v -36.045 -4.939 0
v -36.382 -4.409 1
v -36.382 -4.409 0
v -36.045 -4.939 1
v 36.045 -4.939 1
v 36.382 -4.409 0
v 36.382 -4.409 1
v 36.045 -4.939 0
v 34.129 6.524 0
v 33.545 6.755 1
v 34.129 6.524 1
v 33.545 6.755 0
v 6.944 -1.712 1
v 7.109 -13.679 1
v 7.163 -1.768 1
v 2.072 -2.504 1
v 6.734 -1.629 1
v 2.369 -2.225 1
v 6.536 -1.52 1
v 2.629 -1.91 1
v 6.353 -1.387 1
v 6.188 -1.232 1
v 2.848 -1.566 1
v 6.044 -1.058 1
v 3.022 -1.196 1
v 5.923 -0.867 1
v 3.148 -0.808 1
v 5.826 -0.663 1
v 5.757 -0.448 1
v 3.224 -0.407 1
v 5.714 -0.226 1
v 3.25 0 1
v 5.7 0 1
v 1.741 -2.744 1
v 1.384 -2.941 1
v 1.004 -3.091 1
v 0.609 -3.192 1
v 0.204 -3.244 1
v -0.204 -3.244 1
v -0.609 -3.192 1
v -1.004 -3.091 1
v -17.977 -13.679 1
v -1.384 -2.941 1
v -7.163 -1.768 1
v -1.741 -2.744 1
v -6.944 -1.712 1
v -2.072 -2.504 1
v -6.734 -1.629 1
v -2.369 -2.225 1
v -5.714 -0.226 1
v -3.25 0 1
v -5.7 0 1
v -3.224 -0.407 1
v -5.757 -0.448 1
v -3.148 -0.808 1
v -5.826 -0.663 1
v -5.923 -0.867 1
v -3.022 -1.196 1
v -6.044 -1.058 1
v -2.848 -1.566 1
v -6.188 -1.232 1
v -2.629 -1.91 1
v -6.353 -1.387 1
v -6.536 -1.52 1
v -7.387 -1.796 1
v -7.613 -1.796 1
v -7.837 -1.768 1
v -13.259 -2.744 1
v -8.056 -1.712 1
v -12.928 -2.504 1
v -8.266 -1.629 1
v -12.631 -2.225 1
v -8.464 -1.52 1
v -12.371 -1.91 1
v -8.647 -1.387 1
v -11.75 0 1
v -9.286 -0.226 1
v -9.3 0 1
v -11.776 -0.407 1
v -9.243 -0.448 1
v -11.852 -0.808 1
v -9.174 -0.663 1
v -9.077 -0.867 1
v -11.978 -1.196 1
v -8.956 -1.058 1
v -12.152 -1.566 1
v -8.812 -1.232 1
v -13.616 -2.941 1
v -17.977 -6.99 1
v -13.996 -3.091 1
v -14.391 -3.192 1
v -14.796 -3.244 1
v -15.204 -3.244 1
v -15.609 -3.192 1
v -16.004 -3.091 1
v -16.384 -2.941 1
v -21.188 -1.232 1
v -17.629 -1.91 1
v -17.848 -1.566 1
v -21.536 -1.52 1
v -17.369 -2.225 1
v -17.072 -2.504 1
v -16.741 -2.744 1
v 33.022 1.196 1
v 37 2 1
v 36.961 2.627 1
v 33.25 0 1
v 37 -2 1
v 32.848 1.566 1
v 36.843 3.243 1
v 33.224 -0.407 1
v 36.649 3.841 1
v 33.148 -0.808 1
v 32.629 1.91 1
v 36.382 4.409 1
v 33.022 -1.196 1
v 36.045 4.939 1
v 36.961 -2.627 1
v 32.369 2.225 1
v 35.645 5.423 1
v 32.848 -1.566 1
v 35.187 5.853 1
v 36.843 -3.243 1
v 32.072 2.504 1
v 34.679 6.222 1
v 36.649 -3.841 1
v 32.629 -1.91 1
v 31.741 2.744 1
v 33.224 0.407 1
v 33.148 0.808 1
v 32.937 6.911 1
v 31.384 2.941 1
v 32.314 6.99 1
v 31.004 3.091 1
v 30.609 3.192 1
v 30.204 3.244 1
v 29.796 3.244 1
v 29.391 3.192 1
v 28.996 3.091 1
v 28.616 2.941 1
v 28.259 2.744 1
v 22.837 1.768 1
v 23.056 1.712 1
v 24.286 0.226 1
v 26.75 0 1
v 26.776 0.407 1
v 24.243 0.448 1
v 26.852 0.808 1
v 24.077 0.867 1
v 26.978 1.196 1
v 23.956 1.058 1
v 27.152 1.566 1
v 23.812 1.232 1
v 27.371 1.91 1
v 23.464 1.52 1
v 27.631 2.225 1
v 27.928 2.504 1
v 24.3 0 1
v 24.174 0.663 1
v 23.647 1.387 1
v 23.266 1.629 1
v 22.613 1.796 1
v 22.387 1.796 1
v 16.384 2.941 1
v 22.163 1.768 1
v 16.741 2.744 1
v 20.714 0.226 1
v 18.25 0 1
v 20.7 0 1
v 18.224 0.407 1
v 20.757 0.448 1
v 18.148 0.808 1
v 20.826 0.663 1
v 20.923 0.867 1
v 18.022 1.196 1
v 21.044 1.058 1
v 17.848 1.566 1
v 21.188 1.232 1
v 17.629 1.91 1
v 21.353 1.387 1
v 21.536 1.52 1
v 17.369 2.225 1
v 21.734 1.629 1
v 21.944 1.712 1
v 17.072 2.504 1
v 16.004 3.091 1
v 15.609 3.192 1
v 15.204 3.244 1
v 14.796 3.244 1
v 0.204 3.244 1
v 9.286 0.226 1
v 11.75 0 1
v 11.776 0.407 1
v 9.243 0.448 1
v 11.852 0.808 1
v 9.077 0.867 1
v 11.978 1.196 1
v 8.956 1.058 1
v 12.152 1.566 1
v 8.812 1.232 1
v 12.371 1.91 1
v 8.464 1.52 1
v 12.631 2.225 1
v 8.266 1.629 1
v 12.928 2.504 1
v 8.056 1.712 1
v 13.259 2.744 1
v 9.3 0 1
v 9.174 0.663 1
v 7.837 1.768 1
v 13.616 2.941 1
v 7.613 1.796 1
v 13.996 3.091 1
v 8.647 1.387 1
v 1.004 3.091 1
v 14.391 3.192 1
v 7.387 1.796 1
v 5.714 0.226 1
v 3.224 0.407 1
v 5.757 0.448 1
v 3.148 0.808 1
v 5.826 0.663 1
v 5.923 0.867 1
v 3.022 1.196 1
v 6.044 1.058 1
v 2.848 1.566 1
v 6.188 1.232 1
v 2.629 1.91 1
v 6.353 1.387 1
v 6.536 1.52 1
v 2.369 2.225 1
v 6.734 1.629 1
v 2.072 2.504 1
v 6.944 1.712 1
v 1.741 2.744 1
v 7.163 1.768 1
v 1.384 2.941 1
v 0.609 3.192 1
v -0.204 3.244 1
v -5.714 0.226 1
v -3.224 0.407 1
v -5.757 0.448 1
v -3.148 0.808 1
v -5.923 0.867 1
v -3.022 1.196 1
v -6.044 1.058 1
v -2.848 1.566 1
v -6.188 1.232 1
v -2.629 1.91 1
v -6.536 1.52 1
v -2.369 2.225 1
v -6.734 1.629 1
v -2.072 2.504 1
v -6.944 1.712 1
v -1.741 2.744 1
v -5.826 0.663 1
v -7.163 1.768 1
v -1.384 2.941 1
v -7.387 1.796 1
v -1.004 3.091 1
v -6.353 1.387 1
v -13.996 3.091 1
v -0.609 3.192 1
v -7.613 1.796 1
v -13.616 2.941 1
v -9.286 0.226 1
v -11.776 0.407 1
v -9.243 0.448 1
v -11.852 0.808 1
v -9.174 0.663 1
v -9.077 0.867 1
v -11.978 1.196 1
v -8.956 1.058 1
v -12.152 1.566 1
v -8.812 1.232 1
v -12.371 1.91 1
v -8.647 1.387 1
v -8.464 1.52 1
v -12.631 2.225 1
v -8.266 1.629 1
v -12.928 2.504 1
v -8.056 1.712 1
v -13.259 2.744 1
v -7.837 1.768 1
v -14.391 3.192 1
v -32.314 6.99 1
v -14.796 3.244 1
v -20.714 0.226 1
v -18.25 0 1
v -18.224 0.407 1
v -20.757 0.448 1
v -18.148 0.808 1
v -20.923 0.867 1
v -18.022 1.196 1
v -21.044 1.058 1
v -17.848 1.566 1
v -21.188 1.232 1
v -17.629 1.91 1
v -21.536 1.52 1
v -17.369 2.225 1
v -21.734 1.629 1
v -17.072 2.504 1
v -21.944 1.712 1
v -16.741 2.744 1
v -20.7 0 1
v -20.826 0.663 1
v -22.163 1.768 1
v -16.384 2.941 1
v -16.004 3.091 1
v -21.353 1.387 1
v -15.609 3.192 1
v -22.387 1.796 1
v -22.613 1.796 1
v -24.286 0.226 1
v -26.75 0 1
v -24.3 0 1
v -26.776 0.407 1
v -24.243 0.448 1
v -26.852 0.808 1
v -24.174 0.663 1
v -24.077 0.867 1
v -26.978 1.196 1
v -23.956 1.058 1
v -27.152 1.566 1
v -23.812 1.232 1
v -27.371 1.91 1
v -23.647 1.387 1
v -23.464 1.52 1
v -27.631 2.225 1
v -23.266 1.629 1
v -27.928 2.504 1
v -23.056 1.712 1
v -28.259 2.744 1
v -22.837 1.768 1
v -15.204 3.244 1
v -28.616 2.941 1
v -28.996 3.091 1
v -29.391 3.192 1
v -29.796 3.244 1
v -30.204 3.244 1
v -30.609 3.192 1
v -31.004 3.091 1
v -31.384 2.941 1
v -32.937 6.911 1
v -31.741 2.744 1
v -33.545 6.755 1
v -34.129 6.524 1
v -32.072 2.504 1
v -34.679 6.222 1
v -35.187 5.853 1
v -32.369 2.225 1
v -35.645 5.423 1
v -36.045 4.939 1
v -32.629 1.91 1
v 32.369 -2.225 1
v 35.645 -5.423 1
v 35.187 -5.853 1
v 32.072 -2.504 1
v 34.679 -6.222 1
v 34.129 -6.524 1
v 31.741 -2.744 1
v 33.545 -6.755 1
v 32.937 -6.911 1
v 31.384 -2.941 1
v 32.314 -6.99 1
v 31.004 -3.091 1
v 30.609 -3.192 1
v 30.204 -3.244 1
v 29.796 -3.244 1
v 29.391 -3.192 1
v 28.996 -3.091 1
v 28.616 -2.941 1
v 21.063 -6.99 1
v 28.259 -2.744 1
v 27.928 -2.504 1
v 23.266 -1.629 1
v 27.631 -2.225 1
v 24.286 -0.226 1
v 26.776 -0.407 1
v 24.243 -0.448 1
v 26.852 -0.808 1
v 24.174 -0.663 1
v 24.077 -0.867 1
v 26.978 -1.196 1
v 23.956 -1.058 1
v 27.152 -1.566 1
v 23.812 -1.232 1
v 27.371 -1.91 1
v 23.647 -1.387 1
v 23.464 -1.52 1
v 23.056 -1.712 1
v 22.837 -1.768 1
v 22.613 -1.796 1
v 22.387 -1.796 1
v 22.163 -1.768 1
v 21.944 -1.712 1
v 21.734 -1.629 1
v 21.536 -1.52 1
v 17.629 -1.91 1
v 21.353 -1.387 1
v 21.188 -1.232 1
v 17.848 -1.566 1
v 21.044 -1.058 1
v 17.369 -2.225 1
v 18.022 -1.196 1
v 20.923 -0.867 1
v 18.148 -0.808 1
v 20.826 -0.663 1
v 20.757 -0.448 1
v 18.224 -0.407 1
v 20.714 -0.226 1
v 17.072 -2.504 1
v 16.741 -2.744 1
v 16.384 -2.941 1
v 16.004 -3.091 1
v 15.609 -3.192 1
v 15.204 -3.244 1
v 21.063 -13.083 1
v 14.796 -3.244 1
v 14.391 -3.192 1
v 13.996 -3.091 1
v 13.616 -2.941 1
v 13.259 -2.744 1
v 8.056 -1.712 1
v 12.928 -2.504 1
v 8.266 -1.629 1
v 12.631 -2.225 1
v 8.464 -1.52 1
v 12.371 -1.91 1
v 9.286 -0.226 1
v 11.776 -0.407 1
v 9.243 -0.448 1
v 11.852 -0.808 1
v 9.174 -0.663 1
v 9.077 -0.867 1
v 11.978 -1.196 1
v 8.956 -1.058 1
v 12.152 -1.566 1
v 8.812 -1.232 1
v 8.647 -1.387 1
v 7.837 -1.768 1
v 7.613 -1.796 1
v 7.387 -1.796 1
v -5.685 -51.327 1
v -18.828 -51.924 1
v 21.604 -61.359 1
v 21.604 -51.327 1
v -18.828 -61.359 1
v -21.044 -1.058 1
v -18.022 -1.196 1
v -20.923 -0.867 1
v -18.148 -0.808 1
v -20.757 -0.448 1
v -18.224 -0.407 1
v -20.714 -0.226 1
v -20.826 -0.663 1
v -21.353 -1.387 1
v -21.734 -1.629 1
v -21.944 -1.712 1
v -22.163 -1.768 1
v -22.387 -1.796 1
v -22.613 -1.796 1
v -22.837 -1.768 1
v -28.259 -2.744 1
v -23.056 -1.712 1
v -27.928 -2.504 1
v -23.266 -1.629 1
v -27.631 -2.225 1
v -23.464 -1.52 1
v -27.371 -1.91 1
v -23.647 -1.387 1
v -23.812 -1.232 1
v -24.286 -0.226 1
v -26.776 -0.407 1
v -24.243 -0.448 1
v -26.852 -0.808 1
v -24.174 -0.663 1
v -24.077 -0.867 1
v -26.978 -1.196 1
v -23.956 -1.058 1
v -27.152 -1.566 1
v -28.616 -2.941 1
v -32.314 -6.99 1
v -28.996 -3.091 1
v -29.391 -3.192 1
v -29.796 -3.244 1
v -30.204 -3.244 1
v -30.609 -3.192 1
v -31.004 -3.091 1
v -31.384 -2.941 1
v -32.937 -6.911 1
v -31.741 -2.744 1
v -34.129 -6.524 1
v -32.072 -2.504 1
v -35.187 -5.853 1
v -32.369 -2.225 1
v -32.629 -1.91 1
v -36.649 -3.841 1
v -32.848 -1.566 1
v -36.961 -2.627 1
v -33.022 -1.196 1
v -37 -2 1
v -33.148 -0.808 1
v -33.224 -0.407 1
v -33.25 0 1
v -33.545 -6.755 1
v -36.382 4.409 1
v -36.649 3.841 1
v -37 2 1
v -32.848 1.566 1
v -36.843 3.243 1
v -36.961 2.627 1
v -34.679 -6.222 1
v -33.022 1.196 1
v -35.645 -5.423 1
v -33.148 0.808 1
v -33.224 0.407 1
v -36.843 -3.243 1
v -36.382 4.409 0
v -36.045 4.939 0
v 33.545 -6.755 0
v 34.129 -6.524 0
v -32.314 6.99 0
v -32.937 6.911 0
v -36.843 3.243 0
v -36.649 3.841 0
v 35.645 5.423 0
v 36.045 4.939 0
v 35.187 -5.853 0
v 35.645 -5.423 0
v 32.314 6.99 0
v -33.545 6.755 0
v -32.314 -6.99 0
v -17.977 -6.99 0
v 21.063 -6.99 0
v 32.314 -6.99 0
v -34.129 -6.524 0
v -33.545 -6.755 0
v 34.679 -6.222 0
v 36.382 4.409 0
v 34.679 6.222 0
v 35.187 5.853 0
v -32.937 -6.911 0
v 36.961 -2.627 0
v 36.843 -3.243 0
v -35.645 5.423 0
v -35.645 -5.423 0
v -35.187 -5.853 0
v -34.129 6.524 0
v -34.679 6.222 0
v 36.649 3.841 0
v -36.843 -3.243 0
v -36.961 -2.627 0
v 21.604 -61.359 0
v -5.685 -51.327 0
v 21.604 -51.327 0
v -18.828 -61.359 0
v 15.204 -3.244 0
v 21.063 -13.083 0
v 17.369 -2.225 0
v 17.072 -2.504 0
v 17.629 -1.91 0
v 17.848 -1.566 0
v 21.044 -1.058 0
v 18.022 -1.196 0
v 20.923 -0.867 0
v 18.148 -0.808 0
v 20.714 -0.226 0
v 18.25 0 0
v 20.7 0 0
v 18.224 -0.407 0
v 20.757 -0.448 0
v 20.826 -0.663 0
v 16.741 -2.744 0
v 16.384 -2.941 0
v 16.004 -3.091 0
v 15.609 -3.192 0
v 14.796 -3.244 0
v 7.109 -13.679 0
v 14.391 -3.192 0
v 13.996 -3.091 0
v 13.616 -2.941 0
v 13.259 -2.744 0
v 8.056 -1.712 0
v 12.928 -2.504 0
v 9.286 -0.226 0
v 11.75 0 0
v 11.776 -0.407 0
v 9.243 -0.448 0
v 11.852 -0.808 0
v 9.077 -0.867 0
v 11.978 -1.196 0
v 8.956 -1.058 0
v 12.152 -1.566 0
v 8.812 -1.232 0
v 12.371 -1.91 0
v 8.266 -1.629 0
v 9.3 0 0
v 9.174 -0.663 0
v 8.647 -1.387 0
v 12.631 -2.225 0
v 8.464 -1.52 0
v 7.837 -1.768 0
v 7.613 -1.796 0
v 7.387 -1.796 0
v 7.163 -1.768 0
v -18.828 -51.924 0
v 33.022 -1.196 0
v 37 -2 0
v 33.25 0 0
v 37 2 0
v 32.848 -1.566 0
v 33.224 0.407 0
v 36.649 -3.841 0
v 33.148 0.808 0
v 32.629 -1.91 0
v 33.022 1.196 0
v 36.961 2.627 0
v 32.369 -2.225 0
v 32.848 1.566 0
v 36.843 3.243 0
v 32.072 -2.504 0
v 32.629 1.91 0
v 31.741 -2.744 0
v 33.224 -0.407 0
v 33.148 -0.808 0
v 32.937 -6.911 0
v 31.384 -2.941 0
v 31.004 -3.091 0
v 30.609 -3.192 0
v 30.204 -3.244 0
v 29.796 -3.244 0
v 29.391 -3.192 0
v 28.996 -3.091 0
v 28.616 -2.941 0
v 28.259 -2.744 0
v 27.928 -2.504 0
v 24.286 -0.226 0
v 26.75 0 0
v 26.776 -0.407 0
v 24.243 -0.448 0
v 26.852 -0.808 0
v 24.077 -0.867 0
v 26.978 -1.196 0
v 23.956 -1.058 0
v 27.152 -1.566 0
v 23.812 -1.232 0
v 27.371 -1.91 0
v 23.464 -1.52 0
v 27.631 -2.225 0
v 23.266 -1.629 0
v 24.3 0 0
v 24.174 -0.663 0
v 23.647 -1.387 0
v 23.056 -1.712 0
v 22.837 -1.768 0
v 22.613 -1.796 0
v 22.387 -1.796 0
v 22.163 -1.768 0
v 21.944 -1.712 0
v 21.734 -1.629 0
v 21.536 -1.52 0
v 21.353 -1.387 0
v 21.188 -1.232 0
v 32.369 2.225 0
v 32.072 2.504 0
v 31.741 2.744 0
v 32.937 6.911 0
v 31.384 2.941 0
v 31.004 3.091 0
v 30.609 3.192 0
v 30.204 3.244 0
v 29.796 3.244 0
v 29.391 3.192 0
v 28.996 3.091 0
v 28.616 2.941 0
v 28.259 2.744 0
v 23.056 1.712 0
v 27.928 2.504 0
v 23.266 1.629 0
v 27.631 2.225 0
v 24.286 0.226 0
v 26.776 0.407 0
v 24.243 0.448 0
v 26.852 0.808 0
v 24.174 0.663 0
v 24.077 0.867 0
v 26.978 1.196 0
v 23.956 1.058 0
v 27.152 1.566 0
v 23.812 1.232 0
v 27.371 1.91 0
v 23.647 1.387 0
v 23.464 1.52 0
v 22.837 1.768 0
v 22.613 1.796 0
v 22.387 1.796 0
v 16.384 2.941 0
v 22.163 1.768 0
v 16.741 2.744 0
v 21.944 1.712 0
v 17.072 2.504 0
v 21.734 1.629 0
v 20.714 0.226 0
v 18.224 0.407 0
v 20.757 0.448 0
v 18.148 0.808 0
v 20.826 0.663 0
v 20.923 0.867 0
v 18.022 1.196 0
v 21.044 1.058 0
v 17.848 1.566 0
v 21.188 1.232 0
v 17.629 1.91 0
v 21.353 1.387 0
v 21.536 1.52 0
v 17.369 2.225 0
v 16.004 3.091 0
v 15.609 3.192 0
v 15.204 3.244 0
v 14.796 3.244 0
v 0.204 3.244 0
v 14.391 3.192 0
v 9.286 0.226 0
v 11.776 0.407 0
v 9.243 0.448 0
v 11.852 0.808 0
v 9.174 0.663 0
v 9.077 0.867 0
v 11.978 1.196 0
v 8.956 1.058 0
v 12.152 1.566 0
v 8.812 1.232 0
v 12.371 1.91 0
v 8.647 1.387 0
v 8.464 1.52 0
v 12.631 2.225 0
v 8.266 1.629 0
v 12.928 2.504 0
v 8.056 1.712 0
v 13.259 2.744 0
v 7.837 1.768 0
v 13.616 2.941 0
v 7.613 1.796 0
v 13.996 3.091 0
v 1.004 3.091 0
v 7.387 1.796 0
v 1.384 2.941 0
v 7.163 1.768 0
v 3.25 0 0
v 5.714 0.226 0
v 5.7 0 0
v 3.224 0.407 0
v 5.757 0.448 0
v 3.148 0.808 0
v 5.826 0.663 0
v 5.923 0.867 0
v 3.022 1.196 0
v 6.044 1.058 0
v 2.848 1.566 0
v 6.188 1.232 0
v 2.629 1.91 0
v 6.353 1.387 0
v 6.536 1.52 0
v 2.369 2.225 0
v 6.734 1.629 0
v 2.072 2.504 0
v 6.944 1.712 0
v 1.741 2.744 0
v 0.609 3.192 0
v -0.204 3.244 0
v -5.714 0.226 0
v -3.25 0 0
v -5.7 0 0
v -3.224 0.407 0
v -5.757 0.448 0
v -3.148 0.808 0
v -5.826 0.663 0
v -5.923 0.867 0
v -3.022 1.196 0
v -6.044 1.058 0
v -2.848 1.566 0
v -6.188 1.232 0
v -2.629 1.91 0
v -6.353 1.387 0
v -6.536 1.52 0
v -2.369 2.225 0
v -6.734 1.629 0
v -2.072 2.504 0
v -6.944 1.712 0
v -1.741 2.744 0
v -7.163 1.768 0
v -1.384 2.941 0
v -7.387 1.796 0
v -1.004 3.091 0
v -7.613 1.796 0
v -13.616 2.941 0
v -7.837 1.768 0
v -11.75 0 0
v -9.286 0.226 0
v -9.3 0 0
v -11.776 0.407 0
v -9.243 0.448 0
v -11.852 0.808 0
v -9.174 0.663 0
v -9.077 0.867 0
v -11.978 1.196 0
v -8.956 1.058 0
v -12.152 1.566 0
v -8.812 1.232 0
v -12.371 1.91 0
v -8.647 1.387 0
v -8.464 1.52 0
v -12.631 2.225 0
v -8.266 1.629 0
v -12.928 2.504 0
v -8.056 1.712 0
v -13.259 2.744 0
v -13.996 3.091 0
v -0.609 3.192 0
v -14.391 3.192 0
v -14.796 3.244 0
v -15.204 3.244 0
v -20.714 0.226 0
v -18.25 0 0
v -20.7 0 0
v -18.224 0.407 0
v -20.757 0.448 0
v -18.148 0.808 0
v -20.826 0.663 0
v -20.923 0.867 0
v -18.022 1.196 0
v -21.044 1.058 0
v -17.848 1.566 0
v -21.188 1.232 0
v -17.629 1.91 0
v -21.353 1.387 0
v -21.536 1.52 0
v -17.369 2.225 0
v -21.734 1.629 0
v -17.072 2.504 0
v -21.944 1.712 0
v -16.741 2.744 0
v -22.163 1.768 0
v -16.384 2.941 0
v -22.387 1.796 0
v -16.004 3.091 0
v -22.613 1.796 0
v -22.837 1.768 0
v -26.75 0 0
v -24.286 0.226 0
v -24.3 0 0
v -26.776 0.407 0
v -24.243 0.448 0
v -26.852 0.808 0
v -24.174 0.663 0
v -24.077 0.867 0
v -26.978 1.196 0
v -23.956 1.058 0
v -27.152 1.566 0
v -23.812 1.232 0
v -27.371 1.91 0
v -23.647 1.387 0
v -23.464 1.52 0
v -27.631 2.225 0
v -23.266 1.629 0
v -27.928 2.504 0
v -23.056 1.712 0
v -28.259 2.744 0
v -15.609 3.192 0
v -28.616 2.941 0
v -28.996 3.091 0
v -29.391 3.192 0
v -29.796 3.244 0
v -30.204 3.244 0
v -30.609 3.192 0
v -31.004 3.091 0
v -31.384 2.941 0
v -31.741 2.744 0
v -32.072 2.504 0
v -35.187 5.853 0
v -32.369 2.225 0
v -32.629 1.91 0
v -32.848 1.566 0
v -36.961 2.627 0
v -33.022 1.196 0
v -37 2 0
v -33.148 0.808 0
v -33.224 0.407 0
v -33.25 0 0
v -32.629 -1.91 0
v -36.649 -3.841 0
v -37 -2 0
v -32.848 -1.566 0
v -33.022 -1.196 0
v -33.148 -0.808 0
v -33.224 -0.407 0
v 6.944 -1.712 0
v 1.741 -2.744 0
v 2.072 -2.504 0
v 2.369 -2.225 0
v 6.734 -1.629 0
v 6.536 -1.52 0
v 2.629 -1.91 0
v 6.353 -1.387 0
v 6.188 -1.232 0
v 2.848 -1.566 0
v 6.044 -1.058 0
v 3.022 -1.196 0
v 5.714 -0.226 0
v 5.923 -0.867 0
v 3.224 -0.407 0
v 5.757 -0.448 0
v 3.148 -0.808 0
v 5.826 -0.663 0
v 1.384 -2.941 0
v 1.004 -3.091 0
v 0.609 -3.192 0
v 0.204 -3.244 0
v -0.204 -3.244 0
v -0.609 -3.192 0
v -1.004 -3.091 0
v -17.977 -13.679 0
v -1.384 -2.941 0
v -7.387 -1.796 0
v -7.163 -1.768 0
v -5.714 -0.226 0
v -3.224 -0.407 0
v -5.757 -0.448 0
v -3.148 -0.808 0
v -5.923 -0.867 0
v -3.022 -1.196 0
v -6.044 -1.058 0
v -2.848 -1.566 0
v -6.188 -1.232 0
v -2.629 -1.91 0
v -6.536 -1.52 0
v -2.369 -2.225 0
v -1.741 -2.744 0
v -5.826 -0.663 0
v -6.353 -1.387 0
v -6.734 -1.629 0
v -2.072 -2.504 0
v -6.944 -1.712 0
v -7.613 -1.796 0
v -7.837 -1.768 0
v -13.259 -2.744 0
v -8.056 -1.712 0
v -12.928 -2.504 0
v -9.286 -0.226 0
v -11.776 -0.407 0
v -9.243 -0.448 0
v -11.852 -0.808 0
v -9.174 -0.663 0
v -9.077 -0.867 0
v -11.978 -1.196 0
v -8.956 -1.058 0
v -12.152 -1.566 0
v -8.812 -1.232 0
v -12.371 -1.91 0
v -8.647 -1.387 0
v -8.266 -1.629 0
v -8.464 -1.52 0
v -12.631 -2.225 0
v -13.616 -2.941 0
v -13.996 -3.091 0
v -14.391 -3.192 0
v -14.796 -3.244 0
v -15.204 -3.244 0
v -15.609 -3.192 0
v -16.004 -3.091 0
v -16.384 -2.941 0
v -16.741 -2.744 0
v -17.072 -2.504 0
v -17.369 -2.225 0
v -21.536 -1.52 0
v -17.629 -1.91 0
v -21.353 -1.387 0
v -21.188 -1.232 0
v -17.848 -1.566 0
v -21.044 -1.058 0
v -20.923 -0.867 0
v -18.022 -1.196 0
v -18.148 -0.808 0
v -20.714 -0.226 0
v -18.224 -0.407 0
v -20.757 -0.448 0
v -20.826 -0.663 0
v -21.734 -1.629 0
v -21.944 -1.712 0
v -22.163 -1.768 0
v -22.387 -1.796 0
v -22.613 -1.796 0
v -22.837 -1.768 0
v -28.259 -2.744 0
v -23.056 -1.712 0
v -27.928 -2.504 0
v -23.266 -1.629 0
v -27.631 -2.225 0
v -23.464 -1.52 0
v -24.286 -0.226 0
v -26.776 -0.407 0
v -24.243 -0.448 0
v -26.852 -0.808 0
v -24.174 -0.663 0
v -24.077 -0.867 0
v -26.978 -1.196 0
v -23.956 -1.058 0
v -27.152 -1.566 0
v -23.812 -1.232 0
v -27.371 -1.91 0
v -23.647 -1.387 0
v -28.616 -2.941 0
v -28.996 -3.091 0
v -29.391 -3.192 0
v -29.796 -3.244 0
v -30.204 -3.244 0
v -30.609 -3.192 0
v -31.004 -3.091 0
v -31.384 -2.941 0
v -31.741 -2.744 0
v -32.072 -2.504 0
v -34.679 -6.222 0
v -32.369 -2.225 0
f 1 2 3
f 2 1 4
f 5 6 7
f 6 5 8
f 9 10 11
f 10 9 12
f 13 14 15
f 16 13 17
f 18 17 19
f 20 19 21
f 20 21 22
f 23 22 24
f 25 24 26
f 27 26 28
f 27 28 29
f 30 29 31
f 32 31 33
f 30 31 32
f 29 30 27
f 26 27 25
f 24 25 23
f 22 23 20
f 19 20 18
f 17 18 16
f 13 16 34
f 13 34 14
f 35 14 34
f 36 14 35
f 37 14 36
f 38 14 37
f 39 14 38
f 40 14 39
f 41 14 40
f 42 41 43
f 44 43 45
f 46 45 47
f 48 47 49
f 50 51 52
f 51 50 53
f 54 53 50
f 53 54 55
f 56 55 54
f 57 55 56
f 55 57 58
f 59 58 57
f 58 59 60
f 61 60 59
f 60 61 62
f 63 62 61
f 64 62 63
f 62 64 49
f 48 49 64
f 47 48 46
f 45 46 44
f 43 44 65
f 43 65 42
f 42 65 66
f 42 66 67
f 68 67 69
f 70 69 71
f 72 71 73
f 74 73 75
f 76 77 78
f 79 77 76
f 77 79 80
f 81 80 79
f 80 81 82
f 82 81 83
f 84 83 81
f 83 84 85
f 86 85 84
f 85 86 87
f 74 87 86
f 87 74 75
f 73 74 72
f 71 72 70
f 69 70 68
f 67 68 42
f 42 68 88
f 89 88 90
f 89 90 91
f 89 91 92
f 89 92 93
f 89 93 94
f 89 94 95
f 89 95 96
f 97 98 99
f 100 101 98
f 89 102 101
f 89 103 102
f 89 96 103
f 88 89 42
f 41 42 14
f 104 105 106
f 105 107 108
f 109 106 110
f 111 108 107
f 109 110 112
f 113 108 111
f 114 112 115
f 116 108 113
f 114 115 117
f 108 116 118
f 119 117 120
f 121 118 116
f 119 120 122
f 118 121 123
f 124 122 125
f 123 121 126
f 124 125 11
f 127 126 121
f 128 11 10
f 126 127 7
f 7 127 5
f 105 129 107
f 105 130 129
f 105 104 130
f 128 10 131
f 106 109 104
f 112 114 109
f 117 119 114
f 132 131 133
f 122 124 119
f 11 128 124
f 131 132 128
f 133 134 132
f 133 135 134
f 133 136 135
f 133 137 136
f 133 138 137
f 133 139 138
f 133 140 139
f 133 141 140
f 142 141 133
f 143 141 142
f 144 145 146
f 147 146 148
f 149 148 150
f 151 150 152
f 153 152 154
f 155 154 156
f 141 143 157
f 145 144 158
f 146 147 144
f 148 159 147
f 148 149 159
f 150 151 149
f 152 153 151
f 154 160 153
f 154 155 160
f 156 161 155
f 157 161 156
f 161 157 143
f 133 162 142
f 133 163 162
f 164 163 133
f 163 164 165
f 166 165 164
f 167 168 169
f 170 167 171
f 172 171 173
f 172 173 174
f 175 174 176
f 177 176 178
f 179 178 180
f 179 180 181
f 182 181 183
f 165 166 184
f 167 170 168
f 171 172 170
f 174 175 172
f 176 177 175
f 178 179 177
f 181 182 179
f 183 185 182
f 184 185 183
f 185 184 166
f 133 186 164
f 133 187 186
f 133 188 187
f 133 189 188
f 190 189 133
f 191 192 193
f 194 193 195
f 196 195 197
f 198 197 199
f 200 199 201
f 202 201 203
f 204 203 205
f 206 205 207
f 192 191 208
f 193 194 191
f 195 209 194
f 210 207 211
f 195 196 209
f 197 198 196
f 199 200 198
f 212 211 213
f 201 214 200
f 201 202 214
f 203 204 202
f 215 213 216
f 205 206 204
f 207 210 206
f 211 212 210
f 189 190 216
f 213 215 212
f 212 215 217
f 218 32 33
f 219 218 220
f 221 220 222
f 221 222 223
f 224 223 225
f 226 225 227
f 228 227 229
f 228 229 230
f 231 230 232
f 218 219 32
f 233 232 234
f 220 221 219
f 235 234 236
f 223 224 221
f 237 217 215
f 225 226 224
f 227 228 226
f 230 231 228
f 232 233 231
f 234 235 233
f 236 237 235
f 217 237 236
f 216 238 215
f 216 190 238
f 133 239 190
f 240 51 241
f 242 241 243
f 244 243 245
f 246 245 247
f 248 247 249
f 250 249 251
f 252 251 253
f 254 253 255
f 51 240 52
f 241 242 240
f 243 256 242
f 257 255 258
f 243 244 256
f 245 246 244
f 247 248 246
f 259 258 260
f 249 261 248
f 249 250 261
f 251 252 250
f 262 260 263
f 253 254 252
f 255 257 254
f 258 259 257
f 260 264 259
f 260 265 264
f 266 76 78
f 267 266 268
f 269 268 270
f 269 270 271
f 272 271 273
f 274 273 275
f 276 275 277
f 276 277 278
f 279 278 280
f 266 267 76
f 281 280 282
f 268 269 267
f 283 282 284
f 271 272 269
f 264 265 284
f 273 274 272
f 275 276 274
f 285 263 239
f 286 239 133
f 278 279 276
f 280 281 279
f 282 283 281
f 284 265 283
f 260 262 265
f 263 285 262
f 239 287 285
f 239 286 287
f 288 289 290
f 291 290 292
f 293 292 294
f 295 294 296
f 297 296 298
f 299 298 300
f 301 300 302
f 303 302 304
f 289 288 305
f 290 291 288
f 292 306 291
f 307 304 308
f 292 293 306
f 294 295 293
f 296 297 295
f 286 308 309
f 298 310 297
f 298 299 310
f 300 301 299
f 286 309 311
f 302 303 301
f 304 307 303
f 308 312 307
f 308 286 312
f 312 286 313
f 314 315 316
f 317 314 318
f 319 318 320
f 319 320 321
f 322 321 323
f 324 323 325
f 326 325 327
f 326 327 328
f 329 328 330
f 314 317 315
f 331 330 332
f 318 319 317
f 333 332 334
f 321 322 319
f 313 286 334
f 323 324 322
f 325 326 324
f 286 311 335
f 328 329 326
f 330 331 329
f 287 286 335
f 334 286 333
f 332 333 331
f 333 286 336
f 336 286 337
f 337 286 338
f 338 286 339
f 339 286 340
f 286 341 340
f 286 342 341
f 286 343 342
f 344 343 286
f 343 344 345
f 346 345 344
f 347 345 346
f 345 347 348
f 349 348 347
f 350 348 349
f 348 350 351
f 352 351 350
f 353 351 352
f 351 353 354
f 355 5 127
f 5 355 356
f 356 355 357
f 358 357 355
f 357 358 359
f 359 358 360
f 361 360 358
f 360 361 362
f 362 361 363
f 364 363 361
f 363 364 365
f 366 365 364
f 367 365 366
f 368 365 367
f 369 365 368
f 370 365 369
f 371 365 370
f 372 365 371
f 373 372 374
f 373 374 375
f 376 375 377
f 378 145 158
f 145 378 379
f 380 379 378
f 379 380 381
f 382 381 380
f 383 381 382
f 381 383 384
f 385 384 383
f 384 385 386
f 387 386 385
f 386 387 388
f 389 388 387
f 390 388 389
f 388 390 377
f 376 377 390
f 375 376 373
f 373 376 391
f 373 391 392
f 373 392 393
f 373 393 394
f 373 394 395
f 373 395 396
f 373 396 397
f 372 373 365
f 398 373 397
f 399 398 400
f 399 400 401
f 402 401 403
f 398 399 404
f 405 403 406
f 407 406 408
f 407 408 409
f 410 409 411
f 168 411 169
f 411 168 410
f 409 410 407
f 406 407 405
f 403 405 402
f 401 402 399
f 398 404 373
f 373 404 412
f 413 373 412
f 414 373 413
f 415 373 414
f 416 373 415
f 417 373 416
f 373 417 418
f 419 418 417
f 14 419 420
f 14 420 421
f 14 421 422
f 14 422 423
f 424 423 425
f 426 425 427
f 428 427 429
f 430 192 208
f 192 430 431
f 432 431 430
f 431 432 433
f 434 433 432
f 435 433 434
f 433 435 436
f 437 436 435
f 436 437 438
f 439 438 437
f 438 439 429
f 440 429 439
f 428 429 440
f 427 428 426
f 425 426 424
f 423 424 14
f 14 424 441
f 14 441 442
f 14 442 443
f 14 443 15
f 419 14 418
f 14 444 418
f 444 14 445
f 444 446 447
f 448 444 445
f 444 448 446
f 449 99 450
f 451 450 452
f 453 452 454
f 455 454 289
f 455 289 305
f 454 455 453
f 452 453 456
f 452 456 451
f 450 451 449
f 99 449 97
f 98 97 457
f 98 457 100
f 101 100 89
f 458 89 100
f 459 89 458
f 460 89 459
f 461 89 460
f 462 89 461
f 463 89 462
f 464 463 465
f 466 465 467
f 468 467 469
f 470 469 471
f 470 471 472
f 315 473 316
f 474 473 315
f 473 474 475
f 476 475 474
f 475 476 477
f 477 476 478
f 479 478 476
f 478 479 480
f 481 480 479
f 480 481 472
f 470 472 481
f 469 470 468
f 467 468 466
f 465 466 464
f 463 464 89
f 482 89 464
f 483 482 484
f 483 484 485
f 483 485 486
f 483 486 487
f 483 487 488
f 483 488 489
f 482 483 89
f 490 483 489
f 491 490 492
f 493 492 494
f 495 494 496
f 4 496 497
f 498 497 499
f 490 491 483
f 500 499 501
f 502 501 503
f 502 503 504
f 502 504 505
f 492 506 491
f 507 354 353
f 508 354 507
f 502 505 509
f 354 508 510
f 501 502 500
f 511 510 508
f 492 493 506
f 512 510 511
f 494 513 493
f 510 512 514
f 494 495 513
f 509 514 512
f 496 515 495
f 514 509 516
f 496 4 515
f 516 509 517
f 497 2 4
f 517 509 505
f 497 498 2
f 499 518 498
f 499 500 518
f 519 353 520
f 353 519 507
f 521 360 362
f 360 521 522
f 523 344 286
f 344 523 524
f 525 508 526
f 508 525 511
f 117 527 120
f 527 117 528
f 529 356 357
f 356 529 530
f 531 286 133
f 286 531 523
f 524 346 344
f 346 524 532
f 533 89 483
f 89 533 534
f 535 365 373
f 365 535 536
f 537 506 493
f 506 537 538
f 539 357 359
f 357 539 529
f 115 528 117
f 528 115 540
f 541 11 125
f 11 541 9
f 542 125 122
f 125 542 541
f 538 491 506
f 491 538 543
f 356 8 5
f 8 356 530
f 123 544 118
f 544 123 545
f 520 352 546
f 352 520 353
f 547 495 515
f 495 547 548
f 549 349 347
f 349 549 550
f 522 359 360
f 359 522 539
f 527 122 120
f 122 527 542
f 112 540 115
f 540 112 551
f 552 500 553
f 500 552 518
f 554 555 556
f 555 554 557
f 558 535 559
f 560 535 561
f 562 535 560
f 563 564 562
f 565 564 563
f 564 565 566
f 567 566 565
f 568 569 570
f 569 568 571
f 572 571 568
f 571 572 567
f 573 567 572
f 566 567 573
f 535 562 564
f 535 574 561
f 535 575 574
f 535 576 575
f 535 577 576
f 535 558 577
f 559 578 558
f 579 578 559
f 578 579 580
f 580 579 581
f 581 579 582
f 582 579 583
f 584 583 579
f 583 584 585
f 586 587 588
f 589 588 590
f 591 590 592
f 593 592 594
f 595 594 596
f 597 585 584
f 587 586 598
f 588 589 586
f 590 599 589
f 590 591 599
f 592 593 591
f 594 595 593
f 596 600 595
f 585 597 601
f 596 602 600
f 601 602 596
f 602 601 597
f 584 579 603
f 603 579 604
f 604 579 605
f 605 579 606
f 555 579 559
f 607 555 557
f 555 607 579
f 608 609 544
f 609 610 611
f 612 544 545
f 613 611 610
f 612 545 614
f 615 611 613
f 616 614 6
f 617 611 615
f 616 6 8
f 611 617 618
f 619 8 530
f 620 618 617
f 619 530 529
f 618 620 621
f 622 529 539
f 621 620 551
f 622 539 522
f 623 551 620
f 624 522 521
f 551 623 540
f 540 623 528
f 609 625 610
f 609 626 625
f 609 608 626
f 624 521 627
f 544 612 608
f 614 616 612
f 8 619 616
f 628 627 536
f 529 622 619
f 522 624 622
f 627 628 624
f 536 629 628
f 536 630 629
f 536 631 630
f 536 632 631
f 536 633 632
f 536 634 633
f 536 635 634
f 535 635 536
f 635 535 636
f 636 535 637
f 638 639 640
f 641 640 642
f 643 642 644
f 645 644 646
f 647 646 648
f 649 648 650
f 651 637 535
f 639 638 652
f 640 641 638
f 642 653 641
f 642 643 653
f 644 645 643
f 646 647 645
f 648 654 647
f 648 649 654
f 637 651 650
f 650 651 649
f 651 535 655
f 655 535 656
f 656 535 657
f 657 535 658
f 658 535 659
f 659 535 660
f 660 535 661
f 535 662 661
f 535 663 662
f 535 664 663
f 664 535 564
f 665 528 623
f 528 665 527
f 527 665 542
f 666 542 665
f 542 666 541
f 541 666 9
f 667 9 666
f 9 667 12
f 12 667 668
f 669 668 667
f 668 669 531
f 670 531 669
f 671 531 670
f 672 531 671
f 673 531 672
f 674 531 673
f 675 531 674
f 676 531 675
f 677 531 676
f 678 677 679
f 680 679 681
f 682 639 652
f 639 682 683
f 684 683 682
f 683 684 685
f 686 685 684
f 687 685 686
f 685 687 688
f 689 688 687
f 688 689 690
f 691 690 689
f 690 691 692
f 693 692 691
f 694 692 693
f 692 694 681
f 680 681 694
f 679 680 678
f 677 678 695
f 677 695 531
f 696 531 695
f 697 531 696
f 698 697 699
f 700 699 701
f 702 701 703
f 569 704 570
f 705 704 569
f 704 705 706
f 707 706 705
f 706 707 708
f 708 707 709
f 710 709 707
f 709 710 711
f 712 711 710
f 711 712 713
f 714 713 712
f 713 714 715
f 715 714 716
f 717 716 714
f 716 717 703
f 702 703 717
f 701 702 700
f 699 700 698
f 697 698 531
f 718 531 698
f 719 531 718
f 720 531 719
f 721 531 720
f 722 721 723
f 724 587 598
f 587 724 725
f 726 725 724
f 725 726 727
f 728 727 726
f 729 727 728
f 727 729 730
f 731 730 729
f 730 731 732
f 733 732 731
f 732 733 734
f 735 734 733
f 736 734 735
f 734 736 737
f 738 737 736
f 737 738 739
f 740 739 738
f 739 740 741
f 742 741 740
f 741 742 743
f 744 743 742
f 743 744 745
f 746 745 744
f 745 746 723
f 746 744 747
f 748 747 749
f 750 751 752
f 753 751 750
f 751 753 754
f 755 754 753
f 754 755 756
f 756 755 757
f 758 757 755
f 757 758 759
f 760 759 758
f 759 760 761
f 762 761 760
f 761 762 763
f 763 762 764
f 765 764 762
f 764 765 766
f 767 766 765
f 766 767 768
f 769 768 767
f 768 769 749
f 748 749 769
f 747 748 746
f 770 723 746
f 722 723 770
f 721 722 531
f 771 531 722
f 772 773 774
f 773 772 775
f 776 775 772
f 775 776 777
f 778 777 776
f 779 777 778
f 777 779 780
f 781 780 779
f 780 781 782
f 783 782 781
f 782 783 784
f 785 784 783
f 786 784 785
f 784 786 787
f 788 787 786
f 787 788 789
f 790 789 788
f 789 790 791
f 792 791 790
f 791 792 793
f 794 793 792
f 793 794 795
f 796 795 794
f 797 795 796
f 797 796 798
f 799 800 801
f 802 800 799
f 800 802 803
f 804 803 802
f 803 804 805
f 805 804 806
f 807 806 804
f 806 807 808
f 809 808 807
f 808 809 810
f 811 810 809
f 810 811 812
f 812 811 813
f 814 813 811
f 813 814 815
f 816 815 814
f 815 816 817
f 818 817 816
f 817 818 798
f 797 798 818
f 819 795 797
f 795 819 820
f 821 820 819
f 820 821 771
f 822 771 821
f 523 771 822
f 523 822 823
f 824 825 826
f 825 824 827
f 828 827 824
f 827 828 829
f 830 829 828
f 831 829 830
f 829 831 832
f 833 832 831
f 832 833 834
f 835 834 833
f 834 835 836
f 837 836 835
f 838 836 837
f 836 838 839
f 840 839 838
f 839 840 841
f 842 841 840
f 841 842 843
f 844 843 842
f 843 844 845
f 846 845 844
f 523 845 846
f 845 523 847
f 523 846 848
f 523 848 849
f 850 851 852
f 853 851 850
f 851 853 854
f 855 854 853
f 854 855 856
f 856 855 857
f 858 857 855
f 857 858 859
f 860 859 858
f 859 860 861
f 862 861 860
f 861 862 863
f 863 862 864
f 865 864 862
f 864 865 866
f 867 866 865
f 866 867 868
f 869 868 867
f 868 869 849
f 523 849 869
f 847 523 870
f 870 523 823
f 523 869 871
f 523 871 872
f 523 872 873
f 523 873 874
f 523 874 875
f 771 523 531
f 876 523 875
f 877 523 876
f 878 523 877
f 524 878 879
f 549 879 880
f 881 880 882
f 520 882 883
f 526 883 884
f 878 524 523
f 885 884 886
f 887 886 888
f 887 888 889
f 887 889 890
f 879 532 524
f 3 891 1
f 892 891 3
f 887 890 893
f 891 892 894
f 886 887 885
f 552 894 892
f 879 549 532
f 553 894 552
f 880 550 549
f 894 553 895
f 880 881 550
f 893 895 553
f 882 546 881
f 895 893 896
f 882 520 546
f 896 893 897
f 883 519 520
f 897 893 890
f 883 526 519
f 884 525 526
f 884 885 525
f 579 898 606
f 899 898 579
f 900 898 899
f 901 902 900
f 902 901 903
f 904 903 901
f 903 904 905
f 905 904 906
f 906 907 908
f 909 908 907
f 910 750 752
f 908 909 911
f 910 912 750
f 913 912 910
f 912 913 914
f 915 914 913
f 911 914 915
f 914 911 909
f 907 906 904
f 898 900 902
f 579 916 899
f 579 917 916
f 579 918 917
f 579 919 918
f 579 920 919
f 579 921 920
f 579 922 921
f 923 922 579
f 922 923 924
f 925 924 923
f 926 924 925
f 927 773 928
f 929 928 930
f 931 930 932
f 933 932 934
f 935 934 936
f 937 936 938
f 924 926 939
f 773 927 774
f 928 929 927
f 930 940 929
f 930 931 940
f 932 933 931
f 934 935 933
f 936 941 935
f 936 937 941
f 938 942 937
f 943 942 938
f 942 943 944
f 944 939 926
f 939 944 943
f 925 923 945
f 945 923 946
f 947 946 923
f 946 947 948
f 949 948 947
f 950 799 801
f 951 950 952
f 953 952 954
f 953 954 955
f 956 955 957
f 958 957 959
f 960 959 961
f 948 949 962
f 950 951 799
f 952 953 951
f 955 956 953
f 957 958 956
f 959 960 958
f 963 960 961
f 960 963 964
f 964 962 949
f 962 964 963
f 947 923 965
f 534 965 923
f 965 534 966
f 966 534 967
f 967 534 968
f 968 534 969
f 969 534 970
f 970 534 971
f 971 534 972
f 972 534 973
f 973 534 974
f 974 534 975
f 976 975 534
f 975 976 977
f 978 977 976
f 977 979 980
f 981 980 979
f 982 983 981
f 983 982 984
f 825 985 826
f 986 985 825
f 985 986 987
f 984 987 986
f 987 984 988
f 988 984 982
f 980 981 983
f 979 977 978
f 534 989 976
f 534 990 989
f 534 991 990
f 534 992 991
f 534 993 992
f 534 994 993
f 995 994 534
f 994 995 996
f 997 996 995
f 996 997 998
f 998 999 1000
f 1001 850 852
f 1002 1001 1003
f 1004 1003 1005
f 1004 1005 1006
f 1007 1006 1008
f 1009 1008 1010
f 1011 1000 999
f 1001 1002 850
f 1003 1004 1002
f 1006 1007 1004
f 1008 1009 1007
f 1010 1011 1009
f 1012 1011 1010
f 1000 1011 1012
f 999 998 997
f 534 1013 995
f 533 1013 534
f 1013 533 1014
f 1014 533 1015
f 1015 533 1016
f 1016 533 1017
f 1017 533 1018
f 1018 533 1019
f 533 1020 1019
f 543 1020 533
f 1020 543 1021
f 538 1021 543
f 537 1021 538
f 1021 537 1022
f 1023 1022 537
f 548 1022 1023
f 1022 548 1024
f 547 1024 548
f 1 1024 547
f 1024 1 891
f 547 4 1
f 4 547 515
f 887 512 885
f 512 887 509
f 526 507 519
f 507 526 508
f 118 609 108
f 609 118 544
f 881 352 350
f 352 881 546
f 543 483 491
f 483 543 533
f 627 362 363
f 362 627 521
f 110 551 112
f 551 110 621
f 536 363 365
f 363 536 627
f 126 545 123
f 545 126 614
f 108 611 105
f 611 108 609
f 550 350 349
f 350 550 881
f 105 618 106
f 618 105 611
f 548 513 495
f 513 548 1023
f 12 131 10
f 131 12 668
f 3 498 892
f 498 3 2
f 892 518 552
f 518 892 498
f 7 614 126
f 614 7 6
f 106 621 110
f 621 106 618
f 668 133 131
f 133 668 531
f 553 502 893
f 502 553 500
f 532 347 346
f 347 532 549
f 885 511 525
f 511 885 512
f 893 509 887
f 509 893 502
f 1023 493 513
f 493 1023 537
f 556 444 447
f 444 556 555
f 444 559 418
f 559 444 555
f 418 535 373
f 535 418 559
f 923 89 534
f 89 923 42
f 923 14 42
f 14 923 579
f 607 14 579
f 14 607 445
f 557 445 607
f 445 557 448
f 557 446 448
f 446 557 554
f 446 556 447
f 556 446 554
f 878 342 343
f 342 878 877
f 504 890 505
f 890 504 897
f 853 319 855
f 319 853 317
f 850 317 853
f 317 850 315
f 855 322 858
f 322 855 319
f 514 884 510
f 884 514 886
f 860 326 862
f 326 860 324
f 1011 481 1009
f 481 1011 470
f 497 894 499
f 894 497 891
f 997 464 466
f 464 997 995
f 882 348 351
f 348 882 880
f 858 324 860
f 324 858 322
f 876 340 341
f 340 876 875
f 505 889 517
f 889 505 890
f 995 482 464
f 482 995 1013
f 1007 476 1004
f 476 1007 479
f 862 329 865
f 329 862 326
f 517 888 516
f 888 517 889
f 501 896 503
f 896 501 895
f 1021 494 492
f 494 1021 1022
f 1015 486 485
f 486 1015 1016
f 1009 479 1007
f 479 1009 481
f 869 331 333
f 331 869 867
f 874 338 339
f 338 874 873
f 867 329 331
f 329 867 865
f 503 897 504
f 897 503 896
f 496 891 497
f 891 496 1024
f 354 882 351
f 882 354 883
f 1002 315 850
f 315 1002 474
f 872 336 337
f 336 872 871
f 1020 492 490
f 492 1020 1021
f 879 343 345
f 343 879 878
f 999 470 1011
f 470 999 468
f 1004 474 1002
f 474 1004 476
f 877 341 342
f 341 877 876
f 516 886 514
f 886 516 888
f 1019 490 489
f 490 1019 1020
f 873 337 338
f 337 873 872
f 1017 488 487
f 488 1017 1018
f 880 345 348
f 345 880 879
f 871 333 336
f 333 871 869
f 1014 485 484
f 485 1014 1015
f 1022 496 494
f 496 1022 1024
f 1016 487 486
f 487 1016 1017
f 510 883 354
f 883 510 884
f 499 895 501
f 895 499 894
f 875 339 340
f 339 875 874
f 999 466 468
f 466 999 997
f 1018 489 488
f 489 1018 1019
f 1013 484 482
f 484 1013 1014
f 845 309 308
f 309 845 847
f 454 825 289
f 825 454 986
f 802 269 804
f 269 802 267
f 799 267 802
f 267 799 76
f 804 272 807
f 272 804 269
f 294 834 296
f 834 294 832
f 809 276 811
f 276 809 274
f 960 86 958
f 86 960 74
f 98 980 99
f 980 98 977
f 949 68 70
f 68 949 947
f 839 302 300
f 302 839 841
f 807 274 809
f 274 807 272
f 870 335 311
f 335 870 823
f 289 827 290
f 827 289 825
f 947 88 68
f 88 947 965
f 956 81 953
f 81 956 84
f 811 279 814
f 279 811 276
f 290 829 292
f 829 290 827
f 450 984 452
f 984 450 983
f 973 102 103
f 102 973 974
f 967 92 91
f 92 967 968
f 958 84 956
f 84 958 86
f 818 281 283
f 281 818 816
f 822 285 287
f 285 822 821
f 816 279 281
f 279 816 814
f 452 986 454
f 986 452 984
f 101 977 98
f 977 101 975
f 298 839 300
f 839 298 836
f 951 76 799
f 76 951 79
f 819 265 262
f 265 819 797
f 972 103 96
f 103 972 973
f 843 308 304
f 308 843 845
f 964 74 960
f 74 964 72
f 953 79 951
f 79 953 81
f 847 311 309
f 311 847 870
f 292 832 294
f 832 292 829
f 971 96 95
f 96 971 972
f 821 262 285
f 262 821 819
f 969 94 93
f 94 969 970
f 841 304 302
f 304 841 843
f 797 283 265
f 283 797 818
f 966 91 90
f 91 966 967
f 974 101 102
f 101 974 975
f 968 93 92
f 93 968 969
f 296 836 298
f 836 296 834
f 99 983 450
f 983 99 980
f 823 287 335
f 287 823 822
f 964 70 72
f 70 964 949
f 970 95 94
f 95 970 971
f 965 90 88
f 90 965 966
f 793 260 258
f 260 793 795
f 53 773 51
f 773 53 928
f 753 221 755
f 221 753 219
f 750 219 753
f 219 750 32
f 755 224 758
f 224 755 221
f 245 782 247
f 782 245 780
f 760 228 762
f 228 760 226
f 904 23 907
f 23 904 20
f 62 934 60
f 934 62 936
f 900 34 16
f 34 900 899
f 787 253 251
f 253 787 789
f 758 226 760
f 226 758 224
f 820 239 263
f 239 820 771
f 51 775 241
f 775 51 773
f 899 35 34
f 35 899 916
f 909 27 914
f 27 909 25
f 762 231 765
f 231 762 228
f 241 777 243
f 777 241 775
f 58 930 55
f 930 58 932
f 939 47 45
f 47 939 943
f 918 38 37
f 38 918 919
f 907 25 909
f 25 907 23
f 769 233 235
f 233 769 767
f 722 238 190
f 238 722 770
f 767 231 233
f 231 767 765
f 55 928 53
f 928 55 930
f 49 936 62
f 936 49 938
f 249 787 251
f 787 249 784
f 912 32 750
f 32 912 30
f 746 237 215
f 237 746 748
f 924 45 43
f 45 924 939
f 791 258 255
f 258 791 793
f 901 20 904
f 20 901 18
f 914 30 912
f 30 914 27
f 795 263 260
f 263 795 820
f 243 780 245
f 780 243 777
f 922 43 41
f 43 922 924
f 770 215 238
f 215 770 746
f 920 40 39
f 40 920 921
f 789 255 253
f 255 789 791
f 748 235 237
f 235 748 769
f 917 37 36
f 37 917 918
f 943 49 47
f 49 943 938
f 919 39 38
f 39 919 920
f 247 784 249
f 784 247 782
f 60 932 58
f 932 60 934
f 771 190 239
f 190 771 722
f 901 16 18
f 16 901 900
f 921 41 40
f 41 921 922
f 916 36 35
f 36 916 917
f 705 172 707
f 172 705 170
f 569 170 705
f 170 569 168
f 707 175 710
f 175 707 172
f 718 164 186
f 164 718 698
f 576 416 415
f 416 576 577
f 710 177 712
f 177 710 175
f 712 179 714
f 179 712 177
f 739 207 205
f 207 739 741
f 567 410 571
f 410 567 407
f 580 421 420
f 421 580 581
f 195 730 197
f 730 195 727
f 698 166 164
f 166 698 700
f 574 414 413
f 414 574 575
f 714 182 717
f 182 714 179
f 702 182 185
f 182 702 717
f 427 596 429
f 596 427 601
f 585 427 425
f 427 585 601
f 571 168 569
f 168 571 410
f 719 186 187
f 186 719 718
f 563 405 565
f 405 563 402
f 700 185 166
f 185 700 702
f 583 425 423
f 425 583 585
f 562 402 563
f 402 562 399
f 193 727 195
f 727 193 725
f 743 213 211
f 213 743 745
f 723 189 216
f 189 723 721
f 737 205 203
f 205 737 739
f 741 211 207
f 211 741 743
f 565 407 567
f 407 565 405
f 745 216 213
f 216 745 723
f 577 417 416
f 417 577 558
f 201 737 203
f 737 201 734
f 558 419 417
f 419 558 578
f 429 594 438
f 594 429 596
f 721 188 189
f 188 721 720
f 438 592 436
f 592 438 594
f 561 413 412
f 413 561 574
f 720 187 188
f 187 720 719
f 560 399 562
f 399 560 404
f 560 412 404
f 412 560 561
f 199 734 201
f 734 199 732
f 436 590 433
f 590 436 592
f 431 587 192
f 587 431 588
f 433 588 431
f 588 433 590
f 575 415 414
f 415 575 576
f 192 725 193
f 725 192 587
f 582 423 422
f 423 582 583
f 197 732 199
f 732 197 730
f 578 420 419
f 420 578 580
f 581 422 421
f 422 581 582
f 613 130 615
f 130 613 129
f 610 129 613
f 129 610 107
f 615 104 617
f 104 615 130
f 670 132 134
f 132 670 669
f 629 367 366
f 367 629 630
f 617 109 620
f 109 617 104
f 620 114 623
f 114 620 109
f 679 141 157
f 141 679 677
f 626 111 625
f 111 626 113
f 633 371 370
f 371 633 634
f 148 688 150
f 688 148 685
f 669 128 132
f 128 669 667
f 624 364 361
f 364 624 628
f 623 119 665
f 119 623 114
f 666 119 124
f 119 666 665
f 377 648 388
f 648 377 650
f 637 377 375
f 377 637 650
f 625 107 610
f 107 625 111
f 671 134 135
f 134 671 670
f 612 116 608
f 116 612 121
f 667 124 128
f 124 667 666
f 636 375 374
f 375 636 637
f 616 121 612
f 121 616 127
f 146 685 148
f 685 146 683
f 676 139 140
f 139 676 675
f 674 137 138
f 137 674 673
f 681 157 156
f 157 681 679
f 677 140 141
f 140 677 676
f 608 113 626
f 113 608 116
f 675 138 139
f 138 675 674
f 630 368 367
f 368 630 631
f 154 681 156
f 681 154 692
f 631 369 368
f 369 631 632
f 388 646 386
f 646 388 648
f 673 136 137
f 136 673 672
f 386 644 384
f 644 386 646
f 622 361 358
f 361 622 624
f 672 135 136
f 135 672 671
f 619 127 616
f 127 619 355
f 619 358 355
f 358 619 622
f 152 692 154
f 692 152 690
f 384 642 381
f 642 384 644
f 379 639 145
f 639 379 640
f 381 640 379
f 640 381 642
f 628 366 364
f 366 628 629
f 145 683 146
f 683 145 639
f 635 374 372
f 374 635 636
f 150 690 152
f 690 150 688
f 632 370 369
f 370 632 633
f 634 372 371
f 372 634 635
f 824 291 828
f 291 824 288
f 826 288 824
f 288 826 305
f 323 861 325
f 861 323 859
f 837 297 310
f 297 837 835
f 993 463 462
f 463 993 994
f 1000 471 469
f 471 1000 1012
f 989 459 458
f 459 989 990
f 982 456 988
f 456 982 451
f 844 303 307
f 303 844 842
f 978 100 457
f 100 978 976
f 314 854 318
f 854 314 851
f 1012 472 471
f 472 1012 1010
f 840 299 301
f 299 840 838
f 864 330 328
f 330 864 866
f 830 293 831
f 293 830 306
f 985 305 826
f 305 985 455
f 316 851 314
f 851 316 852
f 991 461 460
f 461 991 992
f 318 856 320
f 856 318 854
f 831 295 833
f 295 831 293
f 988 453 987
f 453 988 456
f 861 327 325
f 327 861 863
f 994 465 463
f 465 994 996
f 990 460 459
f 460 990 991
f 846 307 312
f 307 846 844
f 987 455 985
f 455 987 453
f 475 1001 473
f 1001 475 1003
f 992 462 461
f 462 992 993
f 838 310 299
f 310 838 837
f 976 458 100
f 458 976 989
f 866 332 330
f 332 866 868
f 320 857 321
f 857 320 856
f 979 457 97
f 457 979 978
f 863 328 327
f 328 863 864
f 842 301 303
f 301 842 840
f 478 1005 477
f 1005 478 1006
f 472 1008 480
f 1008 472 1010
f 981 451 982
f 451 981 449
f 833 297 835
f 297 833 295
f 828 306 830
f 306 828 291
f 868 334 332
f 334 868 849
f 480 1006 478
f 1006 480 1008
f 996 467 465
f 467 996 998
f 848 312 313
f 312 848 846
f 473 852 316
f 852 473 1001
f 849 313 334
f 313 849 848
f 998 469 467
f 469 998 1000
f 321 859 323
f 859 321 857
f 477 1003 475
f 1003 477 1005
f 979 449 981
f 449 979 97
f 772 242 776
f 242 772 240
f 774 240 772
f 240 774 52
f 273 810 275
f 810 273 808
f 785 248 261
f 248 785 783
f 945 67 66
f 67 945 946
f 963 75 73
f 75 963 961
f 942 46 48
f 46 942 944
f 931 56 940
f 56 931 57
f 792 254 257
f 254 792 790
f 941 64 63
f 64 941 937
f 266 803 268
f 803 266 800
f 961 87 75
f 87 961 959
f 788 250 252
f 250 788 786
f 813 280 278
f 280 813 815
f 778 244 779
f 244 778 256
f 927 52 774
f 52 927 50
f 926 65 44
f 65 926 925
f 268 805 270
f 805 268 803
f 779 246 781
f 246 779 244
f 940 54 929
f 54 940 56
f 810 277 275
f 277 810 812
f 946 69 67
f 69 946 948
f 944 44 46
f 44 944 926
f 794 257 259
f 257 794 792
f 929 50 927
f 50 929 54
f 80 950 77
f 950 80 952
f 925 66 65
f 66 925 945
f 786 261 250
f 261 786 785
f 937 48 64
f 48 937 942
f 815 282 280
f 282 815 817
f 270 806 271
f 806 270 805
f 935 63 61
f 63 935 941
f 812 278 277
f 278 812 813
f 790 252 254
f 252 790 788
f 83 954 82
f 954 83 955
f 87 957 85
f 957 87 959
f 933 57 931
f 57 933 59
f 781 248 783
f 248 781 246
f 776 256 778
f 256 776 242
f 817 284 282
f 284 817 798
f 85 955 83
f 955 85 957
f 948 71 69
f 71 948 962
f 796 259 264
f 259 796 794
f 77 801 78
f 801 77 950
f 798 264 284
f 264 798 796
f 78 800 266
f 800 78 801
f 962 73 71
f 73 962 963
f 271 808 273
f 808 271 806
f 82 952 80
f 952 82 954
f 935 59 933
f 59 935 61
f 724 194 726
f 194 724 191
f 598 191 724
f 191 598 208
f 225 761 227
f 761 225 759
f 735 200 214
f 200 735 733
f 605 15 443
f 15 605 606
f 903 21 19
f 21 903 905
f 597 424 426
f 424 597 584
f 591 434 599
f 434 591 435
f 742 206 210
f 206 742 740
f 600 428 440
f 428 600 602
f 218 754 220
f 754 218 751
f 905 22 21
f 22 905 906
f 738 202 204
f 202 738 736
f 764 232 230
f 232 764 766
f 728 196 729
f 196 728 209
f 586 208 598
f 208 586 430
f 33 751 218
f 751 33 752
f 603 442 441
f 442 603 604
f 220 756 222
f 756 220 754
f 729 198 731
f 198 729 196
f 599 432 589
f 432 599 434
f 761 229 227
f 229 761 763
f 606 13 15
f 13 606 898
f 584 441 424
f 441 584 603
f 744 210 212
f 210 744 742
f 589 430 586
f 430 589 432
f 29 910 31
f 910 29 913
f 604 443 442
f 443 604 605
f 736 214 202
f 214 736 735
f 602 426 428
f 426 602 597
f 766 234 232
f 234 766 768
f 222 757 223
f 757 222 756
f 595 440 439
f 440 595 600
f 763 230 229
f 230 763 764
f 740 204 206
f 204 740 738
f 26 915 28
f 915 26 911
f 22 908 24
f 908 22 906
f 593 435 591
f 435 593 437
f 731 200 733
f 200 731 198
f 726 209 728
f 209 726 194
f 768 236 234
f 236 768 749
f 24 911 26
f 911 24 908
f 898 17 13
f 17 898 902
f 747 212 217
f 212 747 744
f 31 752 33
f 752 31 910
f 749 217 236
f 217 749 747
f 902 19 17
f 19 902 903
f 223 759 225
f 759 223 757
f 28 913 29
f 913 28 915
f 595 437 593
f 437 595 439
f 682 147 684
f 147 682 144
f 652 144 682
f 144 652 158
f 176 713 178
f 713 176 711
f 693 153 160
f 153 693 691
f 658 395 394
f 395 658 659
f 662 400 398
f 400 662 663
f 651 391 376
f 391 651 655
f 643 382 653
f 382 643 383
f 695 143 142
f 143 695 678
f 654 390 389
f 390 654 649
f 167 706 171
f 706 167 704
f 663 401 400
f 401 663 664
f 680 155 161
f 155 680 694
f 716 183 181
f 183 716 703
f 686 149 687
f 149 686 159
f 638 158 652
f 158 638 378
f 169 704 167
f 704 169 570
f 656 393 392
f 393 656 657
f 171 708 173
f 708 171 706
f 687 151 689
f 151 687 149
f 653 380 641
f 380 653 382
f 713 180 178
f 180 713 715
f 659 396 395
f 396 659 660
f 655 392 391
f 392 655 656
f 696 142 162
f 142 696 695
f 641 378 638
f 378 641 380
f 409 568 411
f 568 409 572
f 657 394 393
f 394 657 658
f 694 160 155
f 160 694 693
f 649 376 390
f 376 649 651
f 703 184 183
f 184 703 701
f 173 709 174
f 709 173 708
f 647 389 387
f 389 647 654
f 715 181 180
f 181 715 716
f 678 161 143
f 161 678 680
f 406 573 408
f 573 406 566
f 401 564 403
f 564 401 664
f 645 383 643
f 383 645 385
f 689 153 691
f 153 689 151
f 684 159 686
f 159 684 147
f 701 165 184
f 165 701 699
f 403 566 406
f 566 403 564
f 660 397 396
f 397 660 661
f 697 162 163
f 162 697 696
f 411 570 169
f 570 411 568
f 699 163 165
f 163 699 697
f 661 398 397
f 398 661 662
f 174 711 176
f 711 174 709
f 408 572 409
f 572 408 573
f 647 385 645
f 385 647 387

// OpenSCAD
$fn = 50;


difference() {
	union() {
		hull() {
			translate(v = [-32.0000000000, 2.0000000000, 0]) {
				cylinder(h = 1, r = 5);
			}
			translate(v = [32.0000000000, 2.0000000000, 0]) {
				cylinder(h = 1, r = 5);
			}
			translate(v = [-32.0000000000, -2.0000000000, 0]) {
				cylinder(h = 1, r = 5);
			}
			translate(v = [32.0000000000, -2.0000000000, 0]) {
				cylinder(h = 1, r = 5);
			}
		}
		translate(v = [0, -5, 0]) {
			linear_extrude(height = 1) {
				text(font = "DejaVu Sans Mono:style=Bold", halign = "center", size = 57.0000000000, text = "Z", valign = "top");
			}
		}
	}
	union() {
		translate(v = [-30.0000000000, 0.0000000000, 0]) {
			translate(v = [0, 0, -100]) {
				cylinder(h = 200, r = 3.2500000000);
			}
		}
		translate(v = [-15.0000000000, 0.0000000000, 0]) {
			translate(v = [0, 0, -100]) {
				cylinder(h = 200, r = 3.2500000000);
			}
		}
		translate(v = [0, 0, -100]) {
			cylinder(h = 200, r = 3.2500000000);
		}
		translate(v = [15.0000000000, 0.0000000000, 0]) {
			translate(v = [0, 0, -100]) {
				cylinder(h = 200, r = 3.2500000000);
			}
		}
		translate(v = [30.0000000000, 0.0000000000, 0]) {
			translate(v = [0, 0, -100]) {
				cylinder(h = 200, r = 3.2500000000);
			}
		}
		translate(v = [-30.0000000000, 0.0000000000, 0]) {
			translate(v = [0, 0, -100]) {
				cylinder(h = 200, r = 1.8000000000);
			}
		}
		translate(v = [-22.5000000000, 0.0000000000, 0]) {
			translate(v = [0, 0, -100]) {
				cylinder(h = 200, r = 1.8000000000);
			}
		}
		translate(v = [-15.0000000000, 0.0000000000, 0]) {
			translate(v = [0, 0, -100]) {
				cylinder(h = 200, r = 1.8000000000);
			}
		}
		translate(v = [-7.5000000000, 0.0000000000, 0]) {
			translate(v = [0, 0, -100]) {
				cylinder(h = 200, r = 1.8000000000);
			}
		}
		translate(v = [0, 0, -100]) {
			cylinder(h = 200, r = 1.8000000000);
		}
		translate(v = [7.5000000000, 0.0000000000, 0]) {
			translate(v = [0, 0, -100]) {
				cylinder(h = 200, r = 1.8000000000);
			}
		}
		translate(v = [15.0000000000, 0.0000000000, 0]) {
			translate(v = [0, 0, -100]) {
				cylinder(h = 200, r = 1.8000000000);
			}
		}
		translate(v = [22.5000000000, 0.0000000000, 0]) {
			translate(v = [0, 0, -100]) {
				cylinder(h = 200, r = 1.8000000000);
			}
		}
		translate(v = [30.0000000000, 0.0000000000, 0]) {
			translate(v = [0, 0, -100]) {
				cylinder(h = 200, r = 1.8000000000);
			}
		}
	}
}
